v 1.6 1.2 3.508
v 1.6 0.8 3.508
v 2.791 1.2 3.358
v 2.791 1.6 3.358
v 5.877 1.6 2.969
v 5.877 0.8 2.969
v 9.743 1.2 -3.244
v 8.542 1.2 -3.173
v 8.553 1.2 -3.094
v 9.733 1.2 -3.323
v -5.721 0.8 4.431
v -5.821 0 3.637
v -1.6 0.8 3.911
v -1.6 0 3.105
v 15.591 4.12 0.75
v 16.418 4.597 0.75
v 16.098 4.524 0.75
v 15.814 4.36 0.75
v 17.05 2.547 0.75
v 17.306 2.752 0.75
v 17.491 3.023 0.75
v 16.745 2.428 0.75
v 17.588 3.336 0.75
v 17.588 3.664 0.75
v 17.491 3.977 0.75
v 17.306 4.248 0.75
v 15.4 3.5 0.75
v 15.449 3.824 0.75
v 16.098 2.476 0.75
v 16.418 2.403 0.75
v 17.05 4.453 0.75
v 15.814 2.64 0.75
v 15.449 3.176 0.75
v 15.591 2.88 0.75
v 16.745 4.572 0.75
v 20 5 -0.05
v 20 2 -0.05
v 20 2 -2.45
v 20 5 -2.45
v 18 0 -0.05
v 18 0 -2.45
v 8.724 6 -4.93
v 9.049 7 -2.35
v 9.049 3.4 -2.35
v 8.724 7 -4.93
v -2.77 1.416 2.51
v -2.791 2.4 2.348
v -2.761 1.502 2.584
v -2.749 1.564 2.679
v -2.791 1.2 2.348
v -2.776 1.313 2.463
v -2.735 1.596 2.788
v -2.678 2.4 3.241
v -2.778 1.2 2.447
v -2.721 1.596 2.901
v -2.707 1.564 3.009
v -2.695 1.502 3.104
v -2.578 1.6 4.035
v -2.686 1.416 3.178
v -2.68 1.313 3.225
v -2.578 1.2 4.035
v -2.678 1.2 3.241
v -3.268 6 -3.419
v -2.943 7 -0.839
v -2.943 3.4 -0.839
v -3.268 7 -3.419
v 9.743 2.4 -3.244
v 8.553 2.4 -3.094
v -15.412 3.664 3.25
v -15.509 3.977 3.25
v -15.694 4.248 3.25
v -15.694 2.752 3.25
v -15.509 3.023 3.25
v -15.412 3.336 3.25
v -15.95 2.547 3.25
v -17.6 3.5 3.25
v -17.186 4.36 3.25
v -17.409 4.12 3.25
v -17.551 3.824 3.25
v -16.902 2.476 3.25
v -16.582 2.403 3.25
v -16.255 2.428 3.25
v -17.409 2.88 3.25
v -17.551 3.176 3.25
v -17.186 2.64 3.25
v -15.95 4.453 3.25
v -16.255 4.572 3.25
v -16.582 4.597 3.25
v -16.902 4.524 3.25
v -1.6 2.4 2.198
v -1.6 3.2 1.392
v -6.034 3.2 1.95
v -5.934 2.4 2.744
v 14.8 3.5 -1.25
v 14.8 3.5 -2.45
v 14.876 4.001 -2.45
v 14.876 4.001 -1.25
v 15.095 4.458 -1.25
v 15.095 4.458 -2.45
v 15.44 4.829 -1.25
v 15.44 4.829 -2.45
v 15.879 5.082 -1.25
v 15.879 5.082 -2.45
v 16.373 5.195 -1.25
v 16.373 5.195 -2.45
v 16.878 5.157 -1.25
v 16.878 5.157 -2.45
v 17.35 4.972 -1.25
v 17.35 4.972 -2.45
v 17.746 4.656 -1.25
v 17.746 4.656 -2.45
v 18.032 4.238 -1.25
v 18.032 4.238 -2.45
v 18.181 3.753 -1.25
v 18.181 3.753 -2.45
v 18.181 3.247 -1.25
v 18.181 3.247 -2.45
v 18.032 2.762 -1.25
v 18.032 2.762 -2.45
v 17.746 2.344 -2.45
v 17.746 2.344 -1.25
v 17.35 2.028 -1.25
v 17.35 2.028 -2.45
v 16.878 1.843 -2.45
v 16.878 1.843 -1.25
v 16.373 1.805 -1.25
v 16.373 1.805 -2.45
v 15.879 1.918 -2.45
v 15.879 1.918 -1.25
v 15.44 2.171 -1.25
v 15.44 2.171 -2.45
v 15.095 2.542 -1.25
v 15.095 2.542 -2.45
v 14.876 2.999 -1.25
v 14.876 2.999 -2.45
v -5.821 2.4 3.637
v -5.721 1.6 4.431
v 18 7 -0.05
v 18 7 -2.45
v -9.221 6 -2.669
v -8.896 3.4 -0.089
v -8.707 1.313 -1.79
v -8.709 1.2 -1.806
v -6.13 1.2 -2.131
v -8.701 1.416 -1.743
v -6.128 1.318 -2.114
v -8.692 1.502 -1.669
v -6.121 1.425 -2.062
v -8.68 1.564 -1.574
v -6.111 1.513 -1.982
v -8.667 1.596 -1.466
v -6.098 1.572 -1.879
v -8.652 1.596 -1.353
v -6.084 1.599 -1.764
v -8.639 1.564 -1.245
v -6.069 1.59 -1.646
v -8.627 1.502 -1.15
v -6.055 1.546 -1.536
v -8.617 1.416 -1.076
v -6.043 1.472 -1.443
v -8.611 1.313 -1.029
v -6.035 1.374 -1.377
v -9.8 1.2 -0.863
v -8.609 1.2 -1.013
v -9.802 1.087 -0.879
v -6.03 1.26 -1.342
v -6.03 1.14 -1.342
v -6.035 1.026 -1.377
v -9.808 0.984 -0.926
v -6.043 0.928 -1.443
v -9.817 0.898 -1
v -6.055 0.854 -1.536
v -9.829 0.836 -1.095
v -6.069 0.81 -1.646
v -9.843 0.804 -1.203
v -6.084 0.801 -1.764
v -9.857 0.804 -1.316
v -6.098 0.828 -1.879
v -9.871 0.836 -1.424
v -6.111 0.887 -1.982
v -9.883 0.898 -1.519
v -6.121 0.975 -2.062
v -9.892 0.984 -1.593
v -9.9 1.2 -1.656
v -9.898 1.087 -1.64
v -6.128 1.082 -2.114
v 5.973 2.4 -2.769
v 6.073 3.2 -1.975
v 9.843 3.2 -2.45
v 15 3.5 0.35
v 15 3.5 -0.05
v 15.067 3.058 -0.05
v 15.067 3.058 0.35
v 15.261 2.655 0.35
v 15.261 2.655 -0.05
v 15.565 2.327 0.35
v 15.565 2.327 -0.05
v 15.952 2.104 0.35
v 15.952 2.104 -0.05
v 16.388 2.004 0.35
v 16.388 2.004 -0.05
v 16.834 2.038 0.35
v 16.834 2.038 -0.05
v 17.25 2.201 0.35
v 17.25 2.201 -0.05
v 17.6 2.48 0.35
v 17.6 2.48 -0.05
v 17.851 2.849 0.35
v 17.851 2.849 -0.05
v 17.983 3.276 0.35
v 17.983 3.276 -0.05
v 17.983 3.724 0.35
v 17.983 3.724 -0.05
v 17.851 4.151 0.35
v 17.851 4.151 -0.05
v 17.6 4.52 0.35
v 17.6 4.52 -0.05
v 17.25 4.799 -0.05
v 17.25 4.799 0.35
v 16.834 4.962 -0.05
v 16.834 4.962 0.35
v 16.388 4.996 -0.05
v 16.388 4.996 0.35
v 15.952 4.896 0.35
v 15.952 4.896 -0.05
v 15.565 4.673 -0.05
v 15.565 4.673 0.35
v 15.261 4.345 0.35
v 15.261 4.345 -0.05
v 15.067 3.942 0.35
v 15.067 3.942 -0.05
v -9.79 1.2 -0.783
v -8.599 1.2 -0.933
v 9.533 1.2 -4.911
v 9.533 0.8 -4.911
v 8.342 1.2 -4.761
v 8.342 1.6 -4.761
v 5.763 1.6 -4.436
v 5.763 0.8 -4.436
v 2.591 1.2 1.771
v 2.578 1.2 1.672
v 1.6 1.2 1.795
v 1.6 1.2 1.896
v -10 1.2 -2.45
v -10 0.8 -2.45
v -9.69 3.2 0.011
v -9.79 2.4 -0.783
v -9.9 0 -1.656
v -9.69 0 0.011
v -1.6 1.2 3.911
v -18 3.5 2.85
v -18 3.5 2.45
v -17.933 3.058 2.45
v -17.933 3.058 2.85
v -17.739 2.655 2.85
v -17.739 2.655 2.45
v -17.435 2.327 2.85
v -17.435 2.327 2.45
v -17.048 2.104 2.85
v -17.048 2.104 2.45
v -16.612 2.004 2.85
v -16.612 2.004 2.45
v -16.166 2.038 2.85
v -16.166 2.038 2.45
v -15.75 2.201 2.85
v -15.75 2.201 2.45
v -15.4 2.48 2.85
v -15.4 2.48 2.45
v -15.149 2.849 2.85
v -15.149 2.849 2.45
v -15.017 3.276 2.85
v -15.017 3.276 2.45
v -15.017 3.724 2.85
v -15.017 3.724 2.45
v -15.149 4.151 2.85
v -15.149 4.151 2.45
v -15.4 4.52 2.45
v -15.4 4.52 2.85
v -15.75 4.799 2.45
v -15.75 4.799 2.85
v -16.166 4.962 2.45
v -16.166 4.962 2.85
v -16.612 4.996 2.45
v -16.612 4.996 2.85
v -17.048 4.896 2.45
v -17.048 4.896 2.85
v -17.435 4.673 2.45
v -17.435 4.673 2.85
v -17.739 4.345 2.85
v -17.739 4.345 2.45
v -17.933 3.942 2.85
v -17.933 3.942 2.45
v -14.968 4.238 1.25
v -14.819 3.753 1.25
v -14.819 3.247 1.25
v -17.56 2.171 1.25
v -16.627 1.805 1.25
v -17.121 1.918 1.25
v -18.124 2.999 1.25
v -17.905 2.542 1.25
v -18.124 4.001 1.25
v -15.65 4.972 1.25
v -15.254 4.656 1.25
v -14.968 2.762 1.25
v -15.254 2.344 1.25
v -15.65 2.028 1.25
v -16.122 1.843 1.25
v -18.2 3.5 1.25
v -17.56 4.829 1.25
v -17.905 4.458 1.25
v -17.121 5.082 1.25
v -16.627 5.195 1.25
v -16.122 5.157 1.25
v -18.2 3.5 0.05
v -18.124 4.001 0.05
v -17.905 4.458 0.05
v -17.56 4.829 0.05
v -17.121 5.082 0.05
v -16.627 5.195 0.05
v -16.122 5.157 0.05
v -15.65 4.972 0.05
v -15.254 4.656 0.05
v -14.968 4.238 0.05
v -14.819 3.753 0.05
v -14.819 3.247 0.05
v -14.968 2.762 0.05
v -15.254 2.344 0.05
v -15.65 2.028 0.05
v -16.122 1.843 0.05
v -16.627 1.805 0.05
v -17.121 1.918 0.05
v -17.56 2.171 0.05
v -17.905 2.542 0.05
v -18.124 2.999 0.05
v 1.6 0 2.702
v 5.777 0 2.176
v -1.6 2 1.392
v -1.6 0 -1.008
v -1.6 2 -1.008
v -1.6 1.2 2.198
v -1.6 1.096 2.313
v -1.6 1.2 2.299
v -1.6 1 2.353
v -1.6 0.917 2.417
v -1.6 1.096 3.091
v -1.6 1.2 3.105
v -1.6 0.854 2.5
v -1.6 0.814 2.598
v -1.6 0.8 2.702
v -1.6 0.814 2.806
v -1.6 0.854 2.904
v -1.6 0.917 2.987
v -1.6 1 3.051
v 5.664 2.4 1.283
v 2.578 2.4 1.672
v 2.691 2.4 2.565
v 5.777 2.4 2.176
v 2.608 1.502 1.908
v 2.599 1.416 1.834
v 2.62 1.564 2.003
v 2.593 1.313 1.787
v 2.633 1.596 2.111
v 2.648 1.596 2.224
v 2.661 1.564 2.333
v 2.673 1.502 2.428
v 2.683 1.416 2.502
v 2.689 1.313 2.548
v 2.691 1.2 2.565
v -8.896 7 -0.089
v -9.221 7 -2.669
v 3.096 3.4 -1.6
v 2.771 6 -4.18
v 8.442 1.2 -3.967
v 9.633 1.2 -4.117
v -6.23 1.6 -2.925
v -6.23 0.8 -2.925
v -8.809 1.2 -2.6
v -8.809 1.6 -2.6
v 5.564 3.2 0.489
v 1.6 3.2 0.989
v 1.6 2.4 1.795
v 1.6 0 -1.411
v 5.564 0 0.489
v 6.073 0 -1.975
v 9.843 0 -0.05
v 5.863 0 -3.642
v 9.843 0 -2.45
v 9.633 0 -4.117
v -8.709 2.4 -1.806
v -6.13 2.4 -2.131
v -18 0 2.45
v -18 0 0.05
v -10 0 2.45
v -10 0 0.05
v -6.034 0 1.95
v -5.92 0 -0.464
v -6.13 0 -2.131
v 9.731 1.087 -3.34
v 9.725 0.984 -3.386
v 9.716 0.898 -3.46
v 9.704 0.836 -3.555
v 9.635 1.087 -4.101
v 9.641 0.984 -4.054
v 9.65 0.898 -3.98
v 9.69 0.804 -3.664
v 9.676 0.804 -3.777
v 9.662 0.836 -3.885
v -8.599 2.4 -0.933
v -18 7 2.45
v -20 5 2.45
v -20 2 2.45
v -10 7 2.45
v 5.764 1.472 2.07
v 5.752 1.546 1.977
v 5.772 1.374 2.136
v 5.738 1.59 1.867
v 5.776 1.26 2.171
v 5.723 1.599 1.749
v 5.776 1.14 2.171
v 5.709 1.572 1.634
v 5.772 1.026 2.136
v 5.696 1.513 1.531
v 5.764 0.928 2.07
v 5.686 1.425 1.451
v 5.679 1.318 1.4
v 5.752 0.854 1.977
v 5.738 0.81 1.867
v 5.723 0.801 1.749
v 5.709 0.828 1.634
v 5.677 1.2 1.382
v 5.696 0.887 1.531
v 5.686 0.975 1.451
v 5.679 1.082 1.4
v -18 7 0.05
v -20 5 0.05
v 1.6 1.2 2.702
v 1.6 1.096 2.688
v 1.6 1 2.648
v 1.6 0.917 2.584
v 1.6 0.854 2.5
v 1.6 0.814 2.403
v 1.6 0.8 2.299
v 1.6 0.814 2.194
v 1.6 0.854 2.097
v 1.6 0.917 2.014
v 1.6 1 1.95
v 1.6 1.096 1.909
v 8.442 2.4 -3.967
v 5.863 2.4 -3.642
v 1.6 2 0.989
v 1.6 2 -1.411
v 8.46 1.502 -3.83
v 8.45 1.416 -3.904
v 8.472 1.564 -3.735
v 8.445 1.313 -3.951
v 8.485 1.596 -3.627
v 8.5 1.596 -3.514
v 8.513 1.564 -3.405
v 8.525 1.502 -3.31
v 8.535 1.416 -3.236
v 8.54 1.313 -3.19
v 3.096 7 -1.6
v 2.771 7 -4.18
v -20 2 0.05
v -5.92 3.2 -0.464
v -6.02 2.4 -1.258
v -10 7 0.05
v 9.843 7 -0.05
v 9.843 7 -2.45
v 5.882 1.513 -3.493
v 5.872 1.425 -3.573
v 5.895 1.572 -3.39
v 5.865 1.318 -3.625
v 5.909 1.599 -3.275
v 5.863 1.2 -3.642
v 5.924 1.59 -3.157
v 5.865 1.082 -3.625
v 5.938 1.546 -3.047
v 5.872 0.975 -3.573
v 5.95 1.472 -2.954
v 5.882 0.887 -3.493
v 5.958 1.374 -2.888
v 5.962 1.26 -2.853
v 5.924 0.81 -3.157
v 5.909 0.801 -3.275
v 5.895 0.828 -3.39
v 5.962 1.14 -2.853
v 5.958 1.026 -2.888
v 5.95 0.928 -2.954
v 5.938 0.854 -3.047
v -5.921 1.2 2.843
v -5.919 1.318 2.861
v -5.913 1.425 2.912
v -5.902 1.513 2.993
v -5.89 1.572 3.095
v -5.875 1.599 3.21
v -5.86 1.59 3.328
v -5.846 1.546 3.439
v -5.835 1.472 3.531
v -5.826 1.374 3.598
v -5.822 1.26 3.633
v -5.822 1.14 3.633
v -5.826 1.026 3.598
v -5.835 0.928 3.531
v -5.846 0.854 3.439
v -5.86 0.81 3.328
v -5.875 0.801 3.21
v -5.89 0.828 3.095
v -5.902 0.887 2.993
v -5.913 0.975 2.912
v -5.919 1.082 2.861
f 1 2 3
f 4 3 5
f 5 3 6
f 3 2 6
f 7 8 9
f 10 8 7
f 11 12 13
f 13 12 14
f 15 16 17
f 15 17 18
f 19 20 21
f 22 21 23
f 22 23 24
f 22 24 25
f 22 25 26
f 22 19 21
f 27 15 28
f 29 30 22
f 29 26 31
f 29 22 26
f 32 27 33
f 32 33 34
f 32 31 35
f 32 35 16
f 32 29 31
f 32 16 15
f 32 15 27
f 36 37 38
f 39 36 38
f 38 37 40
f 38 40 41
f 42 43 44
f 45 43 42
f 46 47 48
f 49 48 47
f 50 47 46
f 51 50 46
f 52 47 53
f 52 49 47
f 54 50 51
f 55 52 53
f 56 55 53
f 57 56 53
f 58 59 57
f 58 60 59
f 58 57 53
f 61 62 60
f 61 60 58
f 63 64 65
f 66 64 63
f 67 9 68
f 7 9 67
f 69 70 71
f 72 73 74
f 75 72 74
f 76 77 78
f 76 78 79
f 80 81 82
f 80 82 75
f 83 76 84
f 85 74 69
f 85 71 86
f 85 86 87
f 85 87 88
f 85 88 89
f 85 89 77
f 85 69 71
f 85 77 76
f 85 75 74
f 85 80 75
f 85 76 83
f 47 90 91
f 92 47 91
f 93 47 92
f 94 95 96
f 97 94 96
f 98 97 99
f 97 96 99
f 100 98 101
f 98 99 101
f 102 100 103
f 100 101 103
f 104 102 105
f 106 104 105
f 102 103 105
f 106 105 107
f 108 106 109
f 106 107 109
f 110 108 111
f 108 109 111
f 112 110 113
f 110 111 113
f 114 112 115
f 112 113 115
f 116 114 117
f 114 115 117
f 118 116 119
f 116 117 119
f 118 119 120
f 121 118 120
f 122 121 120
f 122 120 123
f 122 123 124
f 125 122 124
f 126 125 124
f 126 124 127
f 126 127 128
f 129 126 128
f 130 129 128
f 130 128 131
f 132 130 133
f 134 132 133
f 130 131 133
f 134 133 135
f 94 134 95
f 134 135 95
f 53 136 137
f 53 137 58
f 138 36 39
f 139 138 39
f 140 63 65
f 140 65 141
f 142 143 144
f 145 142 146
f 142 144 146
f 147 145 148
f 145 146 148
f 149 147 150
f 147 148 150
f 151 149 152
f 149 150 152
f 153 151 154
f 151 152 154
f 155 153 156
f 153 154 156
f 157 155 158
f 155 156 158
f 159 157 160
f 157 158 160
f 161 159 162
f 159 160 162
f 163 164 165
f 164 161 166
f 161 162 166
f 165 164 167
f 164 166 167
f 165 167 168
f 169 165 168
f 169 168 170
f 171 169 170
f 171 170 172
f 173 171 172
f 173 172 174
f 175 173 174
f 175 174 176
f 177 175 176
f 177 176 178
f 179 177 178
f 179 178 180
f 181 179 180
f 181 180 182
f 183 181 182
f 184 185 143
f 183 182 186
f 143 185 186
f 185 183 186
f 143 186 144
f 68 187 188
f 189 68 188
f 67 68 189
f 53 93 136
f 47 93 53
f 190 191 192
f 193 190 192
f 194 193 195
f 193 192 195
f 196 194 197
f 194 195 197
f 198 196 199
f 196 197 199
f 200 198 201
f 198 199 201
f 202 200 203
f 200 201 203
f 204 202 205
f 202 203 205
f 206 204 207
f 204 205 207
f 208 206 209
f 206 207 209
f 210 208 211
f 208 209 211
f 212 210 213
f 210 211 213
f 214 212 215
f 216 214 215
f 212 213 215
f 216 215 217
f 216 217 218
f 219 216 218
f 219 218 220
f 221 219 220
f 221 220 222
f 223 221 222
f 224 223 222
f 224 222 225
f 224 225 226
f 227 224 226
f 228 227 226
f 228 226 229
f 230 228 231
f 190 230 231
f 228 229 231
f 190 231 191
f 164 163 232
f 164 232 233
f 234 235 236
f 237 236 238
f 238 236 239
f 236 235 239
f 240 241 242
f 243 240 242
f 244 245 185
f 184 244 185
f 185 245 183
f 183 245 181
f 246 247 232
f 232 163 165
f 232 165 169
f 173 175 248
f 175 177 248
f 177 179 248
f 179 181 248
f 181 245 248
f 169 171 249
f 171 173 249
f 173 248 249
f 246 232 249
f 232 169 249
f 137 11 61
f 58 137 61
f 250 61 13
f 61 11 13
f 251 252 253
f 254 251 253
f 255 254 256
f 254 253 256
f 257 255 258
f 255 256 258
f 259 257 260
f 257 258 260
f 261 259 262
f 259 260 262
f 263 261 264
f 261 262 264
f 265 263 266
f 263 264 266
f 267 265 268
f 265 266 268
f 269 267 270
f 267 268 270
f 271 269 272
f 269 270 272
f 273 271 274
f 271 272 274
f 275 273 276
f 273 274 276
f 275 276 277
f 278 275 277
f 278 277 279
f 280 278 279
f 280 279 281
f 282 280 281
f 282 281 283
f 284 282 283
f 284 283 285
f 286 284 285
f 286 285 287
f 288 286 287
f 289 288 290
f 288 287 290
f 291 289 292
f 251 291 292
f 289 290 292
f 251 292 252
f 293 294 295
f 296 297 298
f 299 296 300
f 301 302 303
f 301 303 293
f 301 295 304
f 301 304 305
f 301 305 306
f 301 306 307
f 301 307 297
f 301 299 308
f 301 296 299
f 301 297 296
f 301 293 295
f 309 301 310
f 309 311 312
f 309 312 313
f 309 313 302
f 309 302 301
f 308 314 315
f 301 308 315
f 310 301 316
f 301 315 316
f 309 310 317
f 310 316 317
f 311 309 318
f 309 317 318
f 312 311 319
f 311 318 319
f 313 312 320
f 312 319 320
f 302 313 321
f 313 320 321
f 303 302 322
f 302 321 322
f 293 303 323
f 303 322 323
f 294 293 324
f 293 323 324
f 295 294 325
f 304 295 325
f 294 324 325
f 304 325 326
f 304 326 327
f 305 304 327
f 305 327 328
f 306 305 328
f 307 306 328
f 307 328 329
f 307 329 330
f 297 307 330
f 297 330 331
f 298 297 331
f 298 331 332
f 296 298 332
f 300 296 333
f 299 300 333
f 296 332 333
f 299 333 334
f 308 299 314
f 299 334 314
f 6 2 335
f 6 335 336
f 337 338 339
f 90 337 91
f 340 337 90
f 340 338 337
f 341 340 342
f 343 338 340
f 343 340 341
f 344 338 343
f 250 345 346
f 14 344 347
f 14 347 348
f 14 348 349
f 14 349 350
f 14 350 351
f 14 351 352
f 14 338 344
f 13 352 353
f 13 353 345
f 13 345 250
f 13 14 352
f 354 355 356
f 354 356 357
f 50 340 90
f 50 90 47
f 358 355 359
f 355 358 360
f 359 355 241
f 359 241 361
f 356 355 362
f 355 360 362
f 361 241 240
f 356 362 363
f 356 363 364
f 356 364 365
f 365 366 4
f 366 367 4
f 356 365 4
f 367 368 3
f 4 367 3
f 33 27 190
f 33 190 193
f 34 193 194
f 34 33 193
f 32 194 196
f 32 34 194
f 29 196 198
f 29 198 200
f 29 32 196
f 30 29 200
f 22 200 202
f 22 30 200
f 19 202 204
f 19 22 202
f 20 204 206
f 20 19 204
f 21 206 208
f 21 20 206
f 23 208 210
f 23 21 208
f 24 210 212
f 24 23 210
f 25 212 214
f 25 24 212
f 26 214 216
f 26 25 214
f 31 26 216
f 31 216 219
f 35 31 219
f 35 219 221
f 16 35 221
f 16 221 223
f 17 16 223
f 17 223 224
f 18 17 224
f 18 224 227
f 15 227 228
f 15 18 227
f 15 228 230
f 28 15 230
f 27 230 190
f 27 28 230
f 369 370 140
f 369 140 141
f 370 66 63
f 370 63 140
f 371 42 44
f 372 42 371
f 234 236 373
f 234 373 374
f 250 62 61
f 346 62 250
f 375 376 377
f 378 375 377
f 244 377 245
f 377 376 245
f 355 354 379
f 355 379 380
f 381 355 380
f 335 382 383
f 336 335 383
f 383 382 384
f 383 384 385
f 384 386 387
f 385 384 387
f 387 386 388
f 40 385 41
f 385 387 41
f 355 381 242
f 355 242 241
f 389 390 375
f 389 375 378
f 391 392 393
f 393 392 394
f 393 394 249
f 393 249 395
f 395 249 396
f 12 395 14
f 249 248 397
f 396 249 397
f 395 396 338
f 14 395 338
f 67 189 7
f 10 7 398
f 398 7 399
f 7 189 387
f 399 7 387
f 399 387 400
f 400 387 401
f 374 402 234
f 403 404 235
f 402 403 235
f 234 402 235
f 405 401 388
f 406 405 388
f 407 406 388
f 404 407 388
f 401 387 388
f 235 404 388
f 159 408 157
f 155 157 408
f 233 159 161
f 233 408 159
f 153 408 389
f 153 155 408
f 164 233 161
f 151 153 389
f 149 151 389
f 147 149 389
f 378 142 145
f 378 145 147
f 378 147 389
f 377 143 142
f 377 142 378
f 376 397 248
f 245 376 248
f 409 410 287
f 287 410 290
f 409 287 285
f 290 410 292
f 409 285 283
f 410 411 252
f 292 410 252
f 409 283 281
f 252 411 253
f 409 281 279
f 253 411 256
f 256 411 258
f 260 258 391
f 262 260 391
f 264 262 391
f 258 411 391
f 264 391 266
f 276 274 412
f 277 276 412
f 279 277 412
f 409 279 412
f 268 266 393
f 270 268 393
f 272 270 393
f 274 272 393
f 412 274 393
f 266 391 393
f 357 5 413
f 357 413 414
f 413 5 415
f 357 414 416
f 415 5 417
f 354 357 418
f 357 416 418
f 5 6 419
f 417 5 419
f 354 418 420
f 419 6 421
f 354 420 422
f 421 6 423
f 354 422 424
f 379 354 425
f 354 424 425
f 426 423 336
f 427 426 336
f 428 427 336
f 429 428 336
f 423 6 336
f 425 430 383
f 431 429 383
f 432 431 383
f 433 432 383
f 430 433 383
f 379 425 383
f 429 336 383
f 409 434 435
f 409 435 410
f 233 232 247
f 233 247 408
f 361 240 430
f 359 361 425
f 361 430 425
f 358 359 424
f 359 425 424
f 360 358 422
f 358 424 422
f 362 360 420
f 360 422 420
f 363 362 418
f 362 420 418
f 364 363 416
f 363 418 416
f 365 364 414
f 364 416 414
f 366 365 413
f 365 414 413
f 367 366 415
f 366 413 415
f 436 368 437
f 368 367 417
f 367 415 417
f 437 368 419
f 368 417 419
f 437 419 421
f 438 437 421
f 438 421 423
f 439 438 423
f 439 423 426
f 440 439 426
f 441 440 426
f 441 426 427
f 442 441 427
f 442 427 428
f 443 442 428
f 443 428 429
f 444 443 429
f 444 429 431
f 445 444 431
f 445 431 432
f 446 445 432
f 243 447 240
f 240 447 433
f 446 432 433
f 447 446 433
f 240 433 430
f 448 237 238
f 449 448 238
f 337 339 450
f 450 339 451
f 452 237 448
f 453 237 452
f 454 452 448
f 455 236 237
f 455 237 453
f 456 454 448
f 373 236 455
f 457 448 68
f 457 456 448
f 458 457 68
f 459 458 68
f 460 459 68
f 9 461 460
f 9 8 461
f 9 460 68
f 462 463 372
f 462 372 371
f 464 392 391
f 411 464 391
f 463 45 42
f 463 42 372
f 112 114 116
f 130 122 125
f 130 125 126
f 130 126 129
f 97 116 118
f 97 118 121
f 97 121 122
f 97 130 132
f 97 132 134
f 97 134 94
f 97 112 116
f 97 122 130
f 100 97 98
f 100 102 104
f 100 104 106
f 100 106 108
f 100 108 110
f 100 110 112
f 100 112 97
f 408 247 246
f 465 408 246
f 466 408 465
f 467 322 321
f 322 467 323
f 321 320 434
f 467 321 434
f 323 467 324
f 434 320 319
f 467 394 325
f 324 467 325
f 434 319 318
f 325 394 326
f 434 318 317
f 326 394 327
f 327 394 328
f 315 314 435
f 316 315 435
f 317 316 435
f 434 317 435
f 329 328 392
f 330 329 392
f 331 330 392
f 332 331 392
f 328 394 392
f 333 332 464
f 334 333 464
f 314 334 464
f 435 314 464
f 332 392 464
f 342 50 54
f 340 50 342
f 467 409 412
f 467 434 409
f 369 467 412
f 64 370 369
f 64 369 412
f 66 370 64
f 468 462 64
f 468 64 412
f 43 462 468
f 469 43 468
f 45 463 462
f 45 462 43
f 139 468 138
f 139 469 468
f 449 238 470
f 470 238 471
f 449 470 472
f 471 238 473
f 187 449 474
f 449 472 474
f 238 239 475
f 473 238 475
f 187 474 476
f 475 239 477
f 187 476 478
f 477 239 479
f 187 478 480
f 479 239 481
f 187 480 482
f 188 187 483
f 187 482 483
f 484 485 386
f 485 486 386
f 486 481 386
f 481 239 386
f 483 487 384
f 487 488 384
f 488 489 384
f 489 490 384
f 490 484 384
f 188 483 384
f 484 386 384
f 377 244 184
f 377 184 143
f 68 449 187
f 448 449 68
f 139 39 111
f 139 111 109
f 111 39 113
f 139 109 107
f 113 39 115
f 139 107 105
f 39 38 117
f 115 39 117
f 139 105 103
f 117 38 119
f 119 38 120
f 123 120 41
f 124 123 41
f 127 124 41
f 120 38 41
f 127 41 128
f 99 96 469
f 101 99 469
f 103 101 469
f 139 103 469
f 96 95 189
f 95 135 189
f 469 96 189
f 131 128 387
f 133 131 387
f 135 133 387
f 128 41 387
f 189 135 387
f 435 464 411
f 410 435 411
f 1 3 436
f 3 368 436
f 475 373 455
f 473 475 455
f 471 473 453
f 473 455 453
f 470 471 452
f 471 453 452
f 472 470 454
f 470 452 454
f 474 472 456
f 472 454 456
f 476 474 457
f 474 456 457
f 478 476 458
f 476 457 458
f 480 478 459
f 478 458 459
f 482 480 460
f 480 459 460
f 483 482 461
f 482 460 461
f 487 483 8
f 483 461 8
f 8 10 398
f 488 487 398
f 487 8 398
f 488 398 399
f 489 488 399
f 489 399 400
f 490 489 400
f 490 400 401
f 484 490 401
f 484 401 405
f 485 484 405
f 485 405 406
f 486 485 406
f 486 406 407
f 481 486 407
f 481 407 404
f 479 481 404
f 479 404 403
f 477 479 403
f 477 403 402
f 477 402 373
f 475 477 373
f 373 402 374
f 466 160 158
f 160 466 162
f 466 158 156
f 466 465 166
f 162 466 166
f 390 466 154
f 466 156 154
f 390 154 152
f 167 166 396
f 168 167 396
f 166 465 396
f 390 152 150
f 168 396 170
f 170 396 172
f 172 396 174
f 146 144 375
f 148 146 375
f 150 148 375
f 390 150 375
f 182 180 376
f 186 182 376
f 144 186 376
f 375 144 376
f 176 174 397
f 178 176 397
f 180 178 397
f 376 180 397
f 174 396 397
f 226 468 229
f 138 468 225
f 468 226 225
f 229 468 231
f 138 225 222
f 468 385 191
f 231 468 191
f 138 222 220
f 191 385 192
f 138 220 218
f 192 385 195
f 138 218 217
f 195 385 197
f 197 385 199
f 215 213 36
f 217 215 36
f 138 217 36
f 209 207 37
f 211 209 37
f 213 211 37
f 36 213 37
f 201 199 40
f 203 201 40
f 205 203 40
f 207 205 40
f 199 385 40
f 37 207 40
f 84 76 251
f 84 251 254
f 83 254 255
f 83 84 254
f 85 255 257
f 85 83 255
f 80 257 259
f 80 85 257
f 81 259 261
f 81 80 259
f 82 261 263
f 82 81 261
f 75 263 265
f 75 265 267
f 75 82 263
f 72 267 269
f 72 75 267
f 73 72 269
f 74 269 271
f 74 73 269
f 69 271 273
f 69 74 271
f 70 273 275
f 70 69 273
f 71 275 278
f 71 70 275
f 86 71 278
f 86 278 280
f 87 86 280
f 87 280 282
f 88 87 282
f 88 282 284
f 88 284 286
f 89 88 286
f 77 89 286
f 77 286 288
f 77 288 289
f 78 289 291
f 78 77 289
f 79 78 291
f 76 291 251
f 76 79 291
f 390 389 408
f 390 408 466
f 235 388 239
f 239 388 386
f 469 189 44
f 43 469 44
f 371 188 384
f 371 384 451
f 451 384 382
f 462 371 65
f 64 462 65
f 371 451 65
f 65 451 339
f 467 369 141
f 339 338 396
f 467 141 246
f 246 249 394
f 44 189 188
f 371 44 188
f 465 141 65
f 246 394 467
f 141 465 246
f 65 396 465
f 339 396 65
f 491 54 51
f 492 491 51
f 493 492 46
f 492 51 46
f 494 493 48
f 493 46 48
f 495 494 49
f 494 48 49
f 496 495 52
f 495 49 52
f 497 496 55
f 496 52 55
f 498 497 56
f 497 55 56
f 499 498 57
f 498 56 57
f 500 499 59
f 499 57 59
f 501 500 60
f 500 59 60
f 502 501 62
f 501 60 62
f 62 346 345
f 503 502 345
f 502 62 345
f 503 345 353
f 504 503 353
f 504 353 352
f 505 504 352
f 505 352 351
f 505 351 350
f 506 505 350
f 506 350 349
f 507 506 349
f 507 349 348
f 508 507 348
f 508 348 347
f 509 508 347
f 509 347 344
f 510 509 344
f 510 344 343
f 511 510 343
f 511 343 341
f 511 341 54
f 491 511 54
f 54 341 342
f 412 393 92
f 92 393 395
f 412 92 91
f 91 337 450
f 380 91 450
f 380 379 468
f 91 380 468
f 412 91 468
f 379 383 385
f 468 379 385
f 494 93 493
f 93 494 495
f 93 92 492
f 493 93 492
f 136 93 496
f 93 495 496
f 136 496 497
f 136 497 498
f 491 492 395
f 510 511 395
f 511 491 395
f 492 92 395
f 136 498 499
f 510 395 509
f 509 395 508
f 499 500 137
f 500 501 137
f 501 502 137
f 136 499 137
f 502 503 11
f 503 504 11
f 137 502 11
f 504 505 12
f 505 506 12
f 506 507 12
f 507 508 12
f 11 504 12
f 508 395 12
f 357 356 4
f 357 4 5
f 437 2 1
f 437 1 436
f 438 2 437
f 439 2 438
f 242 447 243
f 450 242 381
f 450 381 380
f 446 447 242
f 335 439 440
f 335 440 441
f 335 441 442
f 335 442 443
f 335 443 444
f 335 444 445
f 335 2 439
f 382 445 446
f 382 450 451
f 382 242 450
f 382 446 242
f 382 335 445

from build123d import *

# Parameters (mm, degrees)
BOSS_EXTRUDE4_DEPTH      = 2.4
BOSS_EXTRUDE4_2_DEPTH    = 2.4
BOSS_EXTRUDE4_3_DEPTH    = 2.4
BOSS_EXTRUDE4_4_DEPTH    = 2.4
BOSS_EXTRUDE5_DEPTH      = 7
SKETCH2_R                = 1.499999999999997
BOSS_EXTRUDE8_DEPTH      = 0.8
SKETCH3_R                = 1.5000000000000007
BOSS_EXTRUDE9_DEPTH      = 0.8
SKETCH4_R                = 1.6999999999999995
CUT_EXTRUDE3_DEPTH       = 1.2
SKETCH5_R                = 1.6999999999999995
CUT_EXTRUDE4_DEPTH       = 1.2
CHAMFER4_SIZE            = 2
CUT_EXTRUDE7_REACH       = 33.32
SKETCH8_R                = 0.3999999999999905
SKETCH8_R_2              = 0.4000000000000032
CUT_EXTRUDE10_DEPTH      = 2
CHAMFER6_SIZE            = 0.8
CUT_EXTRUDE11_DEPTH      = 10
CUT_EXTRUDE11_DEPTH_BACK = 1.2
BOSS_EXTRUDE10_DEPTH     = 3.6
CHAMFER8_SIZE            = 2.6
CHAMFER9_SIZE            = 0.4


with BuildPart() as part:
    # Sketch1 → Boss-Extrude4 (new body)
    with BuildSketch(Plane(origin=(0, 0, 0), x_dir=(1, 0, 0), z_dir=(0, 1, 0))):
        Polygon((-6.033824051637797, -1.9503087992717978), (-5.721324051637796, -4.430700653394863), (-1.5999999999999996, -3.911462628969018), (-1.5999999999999994, -1.3916994755741596), align=None)
    extrude(amount=BOSS_EXTRUDE4_DEPTH)



with BuildPart() as body_2:
    # Sketch1 → Boss-Extrude4 2 (new body)
    with BuildSketch(Plane(origin=(0, 0, 0), x_dir=(1, 0, 0), z_dir=(0, 1, 0))):
        Polygon((-10.000000000000064, 2.4499999999999993), (-9.689951018234682, -0.01093750000000027), (-5.919755399967642, 0.4640624999999997), (-6.229804381733024, 2.9250000000000003), align=None)
    extrude(amount=BOSS_EXTRUDE4_2_DEPTH)


with BuildPart() as body_3:
    # Sketch1 → Boss-Extrude4 3 (new body)
    with BuildSketch(Plane(origin=(0, 0, 0), x_dir=(1, 0, 0), z_dir=(0, 1, 0))):
        Polygon((5.564458884622125, -0.4890625000000022), (1.6000000000000032, -0.9885373710309839), (1.6000000000000008, -3.508300524425846), (5.876958884622125, -2.969454354123069), align=None)
    extrude(amount=BOSS_EXTRUDE4_3_DEPTH)


with BuildPart() as body_4:
    # Sketch1 → Boss-Extrude4 4 (new body)
    with BuildSketch(Plane(origin=(0, 0, 0), x_dir=(1, 0, 0), z_dir=(0, 1, 0))):
        Polygon((5.7628902329519684, 4.435937500000006), (6.072939214717352, 1.9750000000000023), (9.843134832984354, 2.4499999999999993), (9.533085851218969, 4.910937500000012), align=None)
    extrude(amount=BOSS_EXTRUDE4_4_DEPTH)


with BuildPart() as part_1:
    add(part.part)

    add(body_2.part)  # Boss-Extrude5 merges body 2

    add(body_3.part)  # Boss-Extrude5 merges body 3

    add(body_4.part)  # Boss-Extrude5 merges body 4
    # Sketch1<8> → Boss-Extrude5 (add)
    with BuildSketch(Plane(origin=(0, 0, 0), x_dir=(1, 0, 0), z_dir=(0, 1, 0))):
        Polygon((-20, -0.05000000000000027), (-20, -2.45), (-12, -2.4499999999999997), (-10.000000000000064, -2.4499999999999997), (-6.033824051637797, -1.950308799271796), (-1.9124999999999996, -1.431070774845953), (-1.6000000000000032, -1.391699475574159), (-1.5999999999999999, 1.0083005244258434), (-5.919755399967642, 0.4640624999999997), (-9.689951018234682, -0.01093750000000025), (-10.000000000000064, -0.05000000000000029), (-12, -0.05000000000000027), align=None)
        Polygon((1.6000000000000003, 1.4114626289690202), (1.6000000000000005, -0.988537371030981), (5.564458884622125, -0.4890625000000022), (9.687500000000064, 0.03039185412306233), (9.843134832984425, 0.05000000000000027), (12, 0.05000000000000013), (20, 0.05000000000000013), (20, 2.4499999999999997), (12, 2.4499999999999993), (9.843134832984353, 2.4499999999999993), (6.072939214717351, 1.975000000000004), (1.9100489817653816, 1.4505251289690204), align=None)
        Polygon((-1.5999999999999999, 1.0083005244258434), (-1.5999999999999994, -1.3916994755741596), (1.6000000000000032, -0.9885373710309839), (1.6000000000000003, 1.4114626289690202), align=None)
    extrude(amount=BOSS_EXTRUDE5_DEPTH)

    # Sketch2 → Boss-Extrude8 (add)
    with BuildSketch(Plane.XY.offset(2.4499999999999993)):
        with Locations(Location((-16.5, 3.4999999999999996, 0), (0, 0, 180))):
            Circle(SKETCH2_R)
    extrude(amount=BOSS_EXTRUDE8_DEPTH)

    # Sketch3 → Boss-Extrude9 (add)
    with BuildSketch(Plane.XY.offset(-0.05000000000000013)):
        with Locations(Location((16.5, 3.4999999999999996, 0), (0, 0, 180))):
            Circle(SKETCH3_R)
    extrude(amount=BOSS_EXTRUDE9_DEPTH)

    # Sketch4 → Cut-Extrude3 (cut)
    with BuildSketch(Plane(origin=(0, 0, 0.05000000000000041), x_dir=(-1, 0, -5e-17), z_dir=(5e-17, 0, -1))):
        with Locations((16.5, 3.4999999999999996)):
            Circle(SKETCH4_R)
    extrude(amount=-CUT_EXTRUDE3_DEPTH, mode=Mode.SUBTRACT)

    # Sketch5 → Cut-Extrude4 (cut)
    with BuildSketch(Plane(origin=(-1e-16, 0, -2.449999999999999), x_dir=(-1, 0, 5e-17), z_dir=(-5e-17, 0, -1))):
        with Locations((-16.5, 3.4999999999999996)):
            Circle(SKETCH5_R)
    extrude(amount=-CUT_EXTRUDE4_DEPTH, mode=Mode.SUBTRACT)

    # Chamfer4
    chamfer4_edges = [part_1.edges().sort_by_distance(p)[0] for p in [
        (20, 7, -1.25),
        (-20, 7, 1.2500000000000002),
        (-20, 0, 1.2500000000000002),
        (20, 0, -1.25),
    ]]
    chamfer(chamfer4_edges, length=CHAMFER4_SIZE)

    # Cut-Extrude7: up to this face of the body (flat: up to its plane)
    cut_extrude7_end = Plane(part_1.part.faces().sort_by_distance((-9.844975509, 1.2, -1.21953125))[0])
    # Sketch8 → Cut-Extrude7 (cut, up to the picked face)
    with BuildSketch(Plane(origin=(9.99318385334905, 0, -1.2590228229384695), x_dir=(-0.12500000000000053, 0, -0.9921567416492215), z_dir=(0.9921567416492215, 0, -0.12500000000000053)), mode=Mode.PRIVATE) as cut_extrude7_sk1:
        with Locations((2.4807840170405906, 1.2000000000000017)):
            Circle(SKETCH8_R)
    cut_extrude7_tool1 = split(extrude(cut_extrude7_sk1.sketch, amount=-CUT_EXTRUDE7_REACH, mode=Mode.PRIVATE), bisect_by=cut_extrude7_end, keep=Keep.BOTH, mode=Mode.PRIVATE)
    # Sketch8 → Cut-Extrude7 (cut, up to the picked face)
    with BuildSketch(Plane(origin=(9.99318385334905, 0, -1.2590228229384695), x_dir=(-0.12500000000000053, 0, -0.9921567416492215), z_dir=(0.9921567416492215, 0, -0.12500000000000053)), mode=Mode.PRIVATE) as cut_extrude7_sk2:
        with Locations((-2.4807840170405973, 1.200000000000001)):
            Circle(SKETCH8_R_2)
    cut_extrude7_tool2 = split(extrude(cut_extrude7_sk2.sketch, amount=-CUT_EXTRUDE7_REACH, mode=Mode.PRIVATE), bisect_by=cut_extrude7_end, keep=Keep.BOTH, mode=Mode.PRIVATE)
    add(cut_extrude7_tool1.solids().sort_by(Axis((9.683086, 1.2, -3.720349), (-0.9921567416492215, 0, 0.12500000000000053)))[0], mode=Mode.SUBTRACT)
    add(cut_extrude7_tool2.solids().sort_by(Axis((10.303282, 1.2, 1.202304), (-0.9921567416492215, 0, 0.12500000000000053)))[0], mode=Mode.SUBTRACT)

    # Sketch1<10> → Cut-Extrude10 (cut)
    with BuildSketch(Plane(origin=(0, 0, 0), x_dir=(1, 0, 0), z_dir=(0, 1, 0))):
        Polygon((-1.5999999999999999, 1.0083005244258434), (-1.5999999999999994, -1.3916994755741596), (1.6000000000000032, -0.9885373710309839), (1.6000000000000003, 1.4114626289690202), align=None)
        Polygon((-1.6, 3.5083005244258283), (-1.5999999999999999, 1.0083005244258434), (1.5999999999999979, 1.4114626289690202), (1.6, 3.9114626289690166), align=None)
        Polygon((1.6000000000000032, -0.9885373710309839), (-1.6000000000000032, -1.391699475574159), (-1.5999999999999992, -3.91146262896902), (1.6000000000000014, -3.5083005244258425), align=None)
    extrude(amount=CUT_EXTRUDE10_DEPTH, mode=Mode.SUBTRACT)

    # Chamfer6
    chamfer6_edges = [part_1.edges().sort_by_distance(p)[0] for p in [
        (-3.816912025818899, 2.4, 1.6710041374229787),
        (-3.660662025818898, 2.4, 4.17108164118194),
        (3.738479442311063, 0, 3.2388774392744577),
        (3.582229442311064, 2.4, 0.7387999355154931),
        (3.738479442311063, 2.4, 3.2388774392744577),
        (7.647988042085475, 2.4, -4.673437499999995),
        (7.958037023850853, 2.4, -2.2125000000000017),
        (7.647988042085475, 0, -4.673437499999995),
        (-3.660662025818898, 0, 4.17108164118194),
        (-8.114902190866543, 2.4, -2.6874999999999987),
        (-7.804853209101163, 2.4, -0.22656249999999975),
        (-8.114902190866543, 0, -2.6874999999999987),
    ]]
    chamfer(chamfer6_edges, length=CHAMFER6_SIZE)

    # Sketch9 → Cut-Extrude11 (cut, two sides: drawn at the far end of the back side and taken through both)
    with BuildSketch(Plane(origin=(0, 2.4, 0), x_dir=(1, 0, 0), z_dir=(0, 1, 0)).offset(-CUT_EXTRUDE11_DEPTH_BACK)):
        Polygon((-10.000000000000064, 2.4499999999999984), (-9.789951018234682, 0.7827878933193786), (-8.599362928255616, 0.9327878933193787), (-8.809411910021, 2.5999999999999988), align=None)
        Polygon((-1.5999999999999994, -2.198023684660508), (-2.7905880899790625, -2.348023684660507), (-2.578088089979061, -4.0346901454641975), (-1.3874999999999975, -3.884690145464198), align=None)
        Polygon((1.6000000000000008, -3.508300524425844), (1.3874999999999984, -1.8216340636221509), (2.5780880899790635, -1.671634063622151), (2.790588089979066, -3.3583005244258444), align=None)
        Polygon((9.533085851218972, 4.910937499999992), (8.342497761239906, 4.760937499999993), (8.552546743005287, 3.0937253933193816), (9.743134832984353, 3.2437253933193815), align=None)
    extrude(amount=CUT_EXTRUDE11_DEPTH + CUT_EXTRUDE11_DEPTH_BACK, mode=Mode.SUBTRACT)

    # Sketch10 → Boss-Extrude10 (add)
    with BuildSketch(Plane(origin=(0, 6.999999999999999, 0), x_dir=(1, 0, 0), z_dir=(0, 1, 0))):
        Polygon((8.724409439665015, 4.929607528287985), (2.7714689897696854, 4.179607528287982), (3.0964689897696878, 1.600000000000004), (9.04940943966502, 2.3500000000000094), align=None)
        Polygon((-9.221225624915308, 2.6686700282879747), (-8.896225624915308, 0.08906249999999957), (-2.943285175019977, 0.8390625000000002), (-3.2682851750199777, 3.418670028287977), align=None)
    extrude(amount=-BOSS_EXTRUDE10_DEPTH)

    # Chamfer8
    chamfer8_edges = [part_1.edges().sort_by_distance(p)[0] for p in [
        (-6.244755399967643, 3.399999999999999, -3.0436700282879756),
        (5.74793921471735, 3.399999999999999, -4.554607528287983),
    ]]
    chamfer(chamfer8_edges, length=CHAMFER8_SIZE - 0.0001)  # a hair under: the kernel refuses the full size

    # Chamfer9
    chamfer9_edges = [part_1.edges().sort_by_distance(p)[0] for p in [
        (-15.000000000000004, 3.499999999999999, 3.249999999999999),
        (18, 3.499999999999999, 0.7499999999999999),
    ]]
    chamfer(chamfer9_edges, length=CHAMFER9_SIZE)


solid = part_1.part
